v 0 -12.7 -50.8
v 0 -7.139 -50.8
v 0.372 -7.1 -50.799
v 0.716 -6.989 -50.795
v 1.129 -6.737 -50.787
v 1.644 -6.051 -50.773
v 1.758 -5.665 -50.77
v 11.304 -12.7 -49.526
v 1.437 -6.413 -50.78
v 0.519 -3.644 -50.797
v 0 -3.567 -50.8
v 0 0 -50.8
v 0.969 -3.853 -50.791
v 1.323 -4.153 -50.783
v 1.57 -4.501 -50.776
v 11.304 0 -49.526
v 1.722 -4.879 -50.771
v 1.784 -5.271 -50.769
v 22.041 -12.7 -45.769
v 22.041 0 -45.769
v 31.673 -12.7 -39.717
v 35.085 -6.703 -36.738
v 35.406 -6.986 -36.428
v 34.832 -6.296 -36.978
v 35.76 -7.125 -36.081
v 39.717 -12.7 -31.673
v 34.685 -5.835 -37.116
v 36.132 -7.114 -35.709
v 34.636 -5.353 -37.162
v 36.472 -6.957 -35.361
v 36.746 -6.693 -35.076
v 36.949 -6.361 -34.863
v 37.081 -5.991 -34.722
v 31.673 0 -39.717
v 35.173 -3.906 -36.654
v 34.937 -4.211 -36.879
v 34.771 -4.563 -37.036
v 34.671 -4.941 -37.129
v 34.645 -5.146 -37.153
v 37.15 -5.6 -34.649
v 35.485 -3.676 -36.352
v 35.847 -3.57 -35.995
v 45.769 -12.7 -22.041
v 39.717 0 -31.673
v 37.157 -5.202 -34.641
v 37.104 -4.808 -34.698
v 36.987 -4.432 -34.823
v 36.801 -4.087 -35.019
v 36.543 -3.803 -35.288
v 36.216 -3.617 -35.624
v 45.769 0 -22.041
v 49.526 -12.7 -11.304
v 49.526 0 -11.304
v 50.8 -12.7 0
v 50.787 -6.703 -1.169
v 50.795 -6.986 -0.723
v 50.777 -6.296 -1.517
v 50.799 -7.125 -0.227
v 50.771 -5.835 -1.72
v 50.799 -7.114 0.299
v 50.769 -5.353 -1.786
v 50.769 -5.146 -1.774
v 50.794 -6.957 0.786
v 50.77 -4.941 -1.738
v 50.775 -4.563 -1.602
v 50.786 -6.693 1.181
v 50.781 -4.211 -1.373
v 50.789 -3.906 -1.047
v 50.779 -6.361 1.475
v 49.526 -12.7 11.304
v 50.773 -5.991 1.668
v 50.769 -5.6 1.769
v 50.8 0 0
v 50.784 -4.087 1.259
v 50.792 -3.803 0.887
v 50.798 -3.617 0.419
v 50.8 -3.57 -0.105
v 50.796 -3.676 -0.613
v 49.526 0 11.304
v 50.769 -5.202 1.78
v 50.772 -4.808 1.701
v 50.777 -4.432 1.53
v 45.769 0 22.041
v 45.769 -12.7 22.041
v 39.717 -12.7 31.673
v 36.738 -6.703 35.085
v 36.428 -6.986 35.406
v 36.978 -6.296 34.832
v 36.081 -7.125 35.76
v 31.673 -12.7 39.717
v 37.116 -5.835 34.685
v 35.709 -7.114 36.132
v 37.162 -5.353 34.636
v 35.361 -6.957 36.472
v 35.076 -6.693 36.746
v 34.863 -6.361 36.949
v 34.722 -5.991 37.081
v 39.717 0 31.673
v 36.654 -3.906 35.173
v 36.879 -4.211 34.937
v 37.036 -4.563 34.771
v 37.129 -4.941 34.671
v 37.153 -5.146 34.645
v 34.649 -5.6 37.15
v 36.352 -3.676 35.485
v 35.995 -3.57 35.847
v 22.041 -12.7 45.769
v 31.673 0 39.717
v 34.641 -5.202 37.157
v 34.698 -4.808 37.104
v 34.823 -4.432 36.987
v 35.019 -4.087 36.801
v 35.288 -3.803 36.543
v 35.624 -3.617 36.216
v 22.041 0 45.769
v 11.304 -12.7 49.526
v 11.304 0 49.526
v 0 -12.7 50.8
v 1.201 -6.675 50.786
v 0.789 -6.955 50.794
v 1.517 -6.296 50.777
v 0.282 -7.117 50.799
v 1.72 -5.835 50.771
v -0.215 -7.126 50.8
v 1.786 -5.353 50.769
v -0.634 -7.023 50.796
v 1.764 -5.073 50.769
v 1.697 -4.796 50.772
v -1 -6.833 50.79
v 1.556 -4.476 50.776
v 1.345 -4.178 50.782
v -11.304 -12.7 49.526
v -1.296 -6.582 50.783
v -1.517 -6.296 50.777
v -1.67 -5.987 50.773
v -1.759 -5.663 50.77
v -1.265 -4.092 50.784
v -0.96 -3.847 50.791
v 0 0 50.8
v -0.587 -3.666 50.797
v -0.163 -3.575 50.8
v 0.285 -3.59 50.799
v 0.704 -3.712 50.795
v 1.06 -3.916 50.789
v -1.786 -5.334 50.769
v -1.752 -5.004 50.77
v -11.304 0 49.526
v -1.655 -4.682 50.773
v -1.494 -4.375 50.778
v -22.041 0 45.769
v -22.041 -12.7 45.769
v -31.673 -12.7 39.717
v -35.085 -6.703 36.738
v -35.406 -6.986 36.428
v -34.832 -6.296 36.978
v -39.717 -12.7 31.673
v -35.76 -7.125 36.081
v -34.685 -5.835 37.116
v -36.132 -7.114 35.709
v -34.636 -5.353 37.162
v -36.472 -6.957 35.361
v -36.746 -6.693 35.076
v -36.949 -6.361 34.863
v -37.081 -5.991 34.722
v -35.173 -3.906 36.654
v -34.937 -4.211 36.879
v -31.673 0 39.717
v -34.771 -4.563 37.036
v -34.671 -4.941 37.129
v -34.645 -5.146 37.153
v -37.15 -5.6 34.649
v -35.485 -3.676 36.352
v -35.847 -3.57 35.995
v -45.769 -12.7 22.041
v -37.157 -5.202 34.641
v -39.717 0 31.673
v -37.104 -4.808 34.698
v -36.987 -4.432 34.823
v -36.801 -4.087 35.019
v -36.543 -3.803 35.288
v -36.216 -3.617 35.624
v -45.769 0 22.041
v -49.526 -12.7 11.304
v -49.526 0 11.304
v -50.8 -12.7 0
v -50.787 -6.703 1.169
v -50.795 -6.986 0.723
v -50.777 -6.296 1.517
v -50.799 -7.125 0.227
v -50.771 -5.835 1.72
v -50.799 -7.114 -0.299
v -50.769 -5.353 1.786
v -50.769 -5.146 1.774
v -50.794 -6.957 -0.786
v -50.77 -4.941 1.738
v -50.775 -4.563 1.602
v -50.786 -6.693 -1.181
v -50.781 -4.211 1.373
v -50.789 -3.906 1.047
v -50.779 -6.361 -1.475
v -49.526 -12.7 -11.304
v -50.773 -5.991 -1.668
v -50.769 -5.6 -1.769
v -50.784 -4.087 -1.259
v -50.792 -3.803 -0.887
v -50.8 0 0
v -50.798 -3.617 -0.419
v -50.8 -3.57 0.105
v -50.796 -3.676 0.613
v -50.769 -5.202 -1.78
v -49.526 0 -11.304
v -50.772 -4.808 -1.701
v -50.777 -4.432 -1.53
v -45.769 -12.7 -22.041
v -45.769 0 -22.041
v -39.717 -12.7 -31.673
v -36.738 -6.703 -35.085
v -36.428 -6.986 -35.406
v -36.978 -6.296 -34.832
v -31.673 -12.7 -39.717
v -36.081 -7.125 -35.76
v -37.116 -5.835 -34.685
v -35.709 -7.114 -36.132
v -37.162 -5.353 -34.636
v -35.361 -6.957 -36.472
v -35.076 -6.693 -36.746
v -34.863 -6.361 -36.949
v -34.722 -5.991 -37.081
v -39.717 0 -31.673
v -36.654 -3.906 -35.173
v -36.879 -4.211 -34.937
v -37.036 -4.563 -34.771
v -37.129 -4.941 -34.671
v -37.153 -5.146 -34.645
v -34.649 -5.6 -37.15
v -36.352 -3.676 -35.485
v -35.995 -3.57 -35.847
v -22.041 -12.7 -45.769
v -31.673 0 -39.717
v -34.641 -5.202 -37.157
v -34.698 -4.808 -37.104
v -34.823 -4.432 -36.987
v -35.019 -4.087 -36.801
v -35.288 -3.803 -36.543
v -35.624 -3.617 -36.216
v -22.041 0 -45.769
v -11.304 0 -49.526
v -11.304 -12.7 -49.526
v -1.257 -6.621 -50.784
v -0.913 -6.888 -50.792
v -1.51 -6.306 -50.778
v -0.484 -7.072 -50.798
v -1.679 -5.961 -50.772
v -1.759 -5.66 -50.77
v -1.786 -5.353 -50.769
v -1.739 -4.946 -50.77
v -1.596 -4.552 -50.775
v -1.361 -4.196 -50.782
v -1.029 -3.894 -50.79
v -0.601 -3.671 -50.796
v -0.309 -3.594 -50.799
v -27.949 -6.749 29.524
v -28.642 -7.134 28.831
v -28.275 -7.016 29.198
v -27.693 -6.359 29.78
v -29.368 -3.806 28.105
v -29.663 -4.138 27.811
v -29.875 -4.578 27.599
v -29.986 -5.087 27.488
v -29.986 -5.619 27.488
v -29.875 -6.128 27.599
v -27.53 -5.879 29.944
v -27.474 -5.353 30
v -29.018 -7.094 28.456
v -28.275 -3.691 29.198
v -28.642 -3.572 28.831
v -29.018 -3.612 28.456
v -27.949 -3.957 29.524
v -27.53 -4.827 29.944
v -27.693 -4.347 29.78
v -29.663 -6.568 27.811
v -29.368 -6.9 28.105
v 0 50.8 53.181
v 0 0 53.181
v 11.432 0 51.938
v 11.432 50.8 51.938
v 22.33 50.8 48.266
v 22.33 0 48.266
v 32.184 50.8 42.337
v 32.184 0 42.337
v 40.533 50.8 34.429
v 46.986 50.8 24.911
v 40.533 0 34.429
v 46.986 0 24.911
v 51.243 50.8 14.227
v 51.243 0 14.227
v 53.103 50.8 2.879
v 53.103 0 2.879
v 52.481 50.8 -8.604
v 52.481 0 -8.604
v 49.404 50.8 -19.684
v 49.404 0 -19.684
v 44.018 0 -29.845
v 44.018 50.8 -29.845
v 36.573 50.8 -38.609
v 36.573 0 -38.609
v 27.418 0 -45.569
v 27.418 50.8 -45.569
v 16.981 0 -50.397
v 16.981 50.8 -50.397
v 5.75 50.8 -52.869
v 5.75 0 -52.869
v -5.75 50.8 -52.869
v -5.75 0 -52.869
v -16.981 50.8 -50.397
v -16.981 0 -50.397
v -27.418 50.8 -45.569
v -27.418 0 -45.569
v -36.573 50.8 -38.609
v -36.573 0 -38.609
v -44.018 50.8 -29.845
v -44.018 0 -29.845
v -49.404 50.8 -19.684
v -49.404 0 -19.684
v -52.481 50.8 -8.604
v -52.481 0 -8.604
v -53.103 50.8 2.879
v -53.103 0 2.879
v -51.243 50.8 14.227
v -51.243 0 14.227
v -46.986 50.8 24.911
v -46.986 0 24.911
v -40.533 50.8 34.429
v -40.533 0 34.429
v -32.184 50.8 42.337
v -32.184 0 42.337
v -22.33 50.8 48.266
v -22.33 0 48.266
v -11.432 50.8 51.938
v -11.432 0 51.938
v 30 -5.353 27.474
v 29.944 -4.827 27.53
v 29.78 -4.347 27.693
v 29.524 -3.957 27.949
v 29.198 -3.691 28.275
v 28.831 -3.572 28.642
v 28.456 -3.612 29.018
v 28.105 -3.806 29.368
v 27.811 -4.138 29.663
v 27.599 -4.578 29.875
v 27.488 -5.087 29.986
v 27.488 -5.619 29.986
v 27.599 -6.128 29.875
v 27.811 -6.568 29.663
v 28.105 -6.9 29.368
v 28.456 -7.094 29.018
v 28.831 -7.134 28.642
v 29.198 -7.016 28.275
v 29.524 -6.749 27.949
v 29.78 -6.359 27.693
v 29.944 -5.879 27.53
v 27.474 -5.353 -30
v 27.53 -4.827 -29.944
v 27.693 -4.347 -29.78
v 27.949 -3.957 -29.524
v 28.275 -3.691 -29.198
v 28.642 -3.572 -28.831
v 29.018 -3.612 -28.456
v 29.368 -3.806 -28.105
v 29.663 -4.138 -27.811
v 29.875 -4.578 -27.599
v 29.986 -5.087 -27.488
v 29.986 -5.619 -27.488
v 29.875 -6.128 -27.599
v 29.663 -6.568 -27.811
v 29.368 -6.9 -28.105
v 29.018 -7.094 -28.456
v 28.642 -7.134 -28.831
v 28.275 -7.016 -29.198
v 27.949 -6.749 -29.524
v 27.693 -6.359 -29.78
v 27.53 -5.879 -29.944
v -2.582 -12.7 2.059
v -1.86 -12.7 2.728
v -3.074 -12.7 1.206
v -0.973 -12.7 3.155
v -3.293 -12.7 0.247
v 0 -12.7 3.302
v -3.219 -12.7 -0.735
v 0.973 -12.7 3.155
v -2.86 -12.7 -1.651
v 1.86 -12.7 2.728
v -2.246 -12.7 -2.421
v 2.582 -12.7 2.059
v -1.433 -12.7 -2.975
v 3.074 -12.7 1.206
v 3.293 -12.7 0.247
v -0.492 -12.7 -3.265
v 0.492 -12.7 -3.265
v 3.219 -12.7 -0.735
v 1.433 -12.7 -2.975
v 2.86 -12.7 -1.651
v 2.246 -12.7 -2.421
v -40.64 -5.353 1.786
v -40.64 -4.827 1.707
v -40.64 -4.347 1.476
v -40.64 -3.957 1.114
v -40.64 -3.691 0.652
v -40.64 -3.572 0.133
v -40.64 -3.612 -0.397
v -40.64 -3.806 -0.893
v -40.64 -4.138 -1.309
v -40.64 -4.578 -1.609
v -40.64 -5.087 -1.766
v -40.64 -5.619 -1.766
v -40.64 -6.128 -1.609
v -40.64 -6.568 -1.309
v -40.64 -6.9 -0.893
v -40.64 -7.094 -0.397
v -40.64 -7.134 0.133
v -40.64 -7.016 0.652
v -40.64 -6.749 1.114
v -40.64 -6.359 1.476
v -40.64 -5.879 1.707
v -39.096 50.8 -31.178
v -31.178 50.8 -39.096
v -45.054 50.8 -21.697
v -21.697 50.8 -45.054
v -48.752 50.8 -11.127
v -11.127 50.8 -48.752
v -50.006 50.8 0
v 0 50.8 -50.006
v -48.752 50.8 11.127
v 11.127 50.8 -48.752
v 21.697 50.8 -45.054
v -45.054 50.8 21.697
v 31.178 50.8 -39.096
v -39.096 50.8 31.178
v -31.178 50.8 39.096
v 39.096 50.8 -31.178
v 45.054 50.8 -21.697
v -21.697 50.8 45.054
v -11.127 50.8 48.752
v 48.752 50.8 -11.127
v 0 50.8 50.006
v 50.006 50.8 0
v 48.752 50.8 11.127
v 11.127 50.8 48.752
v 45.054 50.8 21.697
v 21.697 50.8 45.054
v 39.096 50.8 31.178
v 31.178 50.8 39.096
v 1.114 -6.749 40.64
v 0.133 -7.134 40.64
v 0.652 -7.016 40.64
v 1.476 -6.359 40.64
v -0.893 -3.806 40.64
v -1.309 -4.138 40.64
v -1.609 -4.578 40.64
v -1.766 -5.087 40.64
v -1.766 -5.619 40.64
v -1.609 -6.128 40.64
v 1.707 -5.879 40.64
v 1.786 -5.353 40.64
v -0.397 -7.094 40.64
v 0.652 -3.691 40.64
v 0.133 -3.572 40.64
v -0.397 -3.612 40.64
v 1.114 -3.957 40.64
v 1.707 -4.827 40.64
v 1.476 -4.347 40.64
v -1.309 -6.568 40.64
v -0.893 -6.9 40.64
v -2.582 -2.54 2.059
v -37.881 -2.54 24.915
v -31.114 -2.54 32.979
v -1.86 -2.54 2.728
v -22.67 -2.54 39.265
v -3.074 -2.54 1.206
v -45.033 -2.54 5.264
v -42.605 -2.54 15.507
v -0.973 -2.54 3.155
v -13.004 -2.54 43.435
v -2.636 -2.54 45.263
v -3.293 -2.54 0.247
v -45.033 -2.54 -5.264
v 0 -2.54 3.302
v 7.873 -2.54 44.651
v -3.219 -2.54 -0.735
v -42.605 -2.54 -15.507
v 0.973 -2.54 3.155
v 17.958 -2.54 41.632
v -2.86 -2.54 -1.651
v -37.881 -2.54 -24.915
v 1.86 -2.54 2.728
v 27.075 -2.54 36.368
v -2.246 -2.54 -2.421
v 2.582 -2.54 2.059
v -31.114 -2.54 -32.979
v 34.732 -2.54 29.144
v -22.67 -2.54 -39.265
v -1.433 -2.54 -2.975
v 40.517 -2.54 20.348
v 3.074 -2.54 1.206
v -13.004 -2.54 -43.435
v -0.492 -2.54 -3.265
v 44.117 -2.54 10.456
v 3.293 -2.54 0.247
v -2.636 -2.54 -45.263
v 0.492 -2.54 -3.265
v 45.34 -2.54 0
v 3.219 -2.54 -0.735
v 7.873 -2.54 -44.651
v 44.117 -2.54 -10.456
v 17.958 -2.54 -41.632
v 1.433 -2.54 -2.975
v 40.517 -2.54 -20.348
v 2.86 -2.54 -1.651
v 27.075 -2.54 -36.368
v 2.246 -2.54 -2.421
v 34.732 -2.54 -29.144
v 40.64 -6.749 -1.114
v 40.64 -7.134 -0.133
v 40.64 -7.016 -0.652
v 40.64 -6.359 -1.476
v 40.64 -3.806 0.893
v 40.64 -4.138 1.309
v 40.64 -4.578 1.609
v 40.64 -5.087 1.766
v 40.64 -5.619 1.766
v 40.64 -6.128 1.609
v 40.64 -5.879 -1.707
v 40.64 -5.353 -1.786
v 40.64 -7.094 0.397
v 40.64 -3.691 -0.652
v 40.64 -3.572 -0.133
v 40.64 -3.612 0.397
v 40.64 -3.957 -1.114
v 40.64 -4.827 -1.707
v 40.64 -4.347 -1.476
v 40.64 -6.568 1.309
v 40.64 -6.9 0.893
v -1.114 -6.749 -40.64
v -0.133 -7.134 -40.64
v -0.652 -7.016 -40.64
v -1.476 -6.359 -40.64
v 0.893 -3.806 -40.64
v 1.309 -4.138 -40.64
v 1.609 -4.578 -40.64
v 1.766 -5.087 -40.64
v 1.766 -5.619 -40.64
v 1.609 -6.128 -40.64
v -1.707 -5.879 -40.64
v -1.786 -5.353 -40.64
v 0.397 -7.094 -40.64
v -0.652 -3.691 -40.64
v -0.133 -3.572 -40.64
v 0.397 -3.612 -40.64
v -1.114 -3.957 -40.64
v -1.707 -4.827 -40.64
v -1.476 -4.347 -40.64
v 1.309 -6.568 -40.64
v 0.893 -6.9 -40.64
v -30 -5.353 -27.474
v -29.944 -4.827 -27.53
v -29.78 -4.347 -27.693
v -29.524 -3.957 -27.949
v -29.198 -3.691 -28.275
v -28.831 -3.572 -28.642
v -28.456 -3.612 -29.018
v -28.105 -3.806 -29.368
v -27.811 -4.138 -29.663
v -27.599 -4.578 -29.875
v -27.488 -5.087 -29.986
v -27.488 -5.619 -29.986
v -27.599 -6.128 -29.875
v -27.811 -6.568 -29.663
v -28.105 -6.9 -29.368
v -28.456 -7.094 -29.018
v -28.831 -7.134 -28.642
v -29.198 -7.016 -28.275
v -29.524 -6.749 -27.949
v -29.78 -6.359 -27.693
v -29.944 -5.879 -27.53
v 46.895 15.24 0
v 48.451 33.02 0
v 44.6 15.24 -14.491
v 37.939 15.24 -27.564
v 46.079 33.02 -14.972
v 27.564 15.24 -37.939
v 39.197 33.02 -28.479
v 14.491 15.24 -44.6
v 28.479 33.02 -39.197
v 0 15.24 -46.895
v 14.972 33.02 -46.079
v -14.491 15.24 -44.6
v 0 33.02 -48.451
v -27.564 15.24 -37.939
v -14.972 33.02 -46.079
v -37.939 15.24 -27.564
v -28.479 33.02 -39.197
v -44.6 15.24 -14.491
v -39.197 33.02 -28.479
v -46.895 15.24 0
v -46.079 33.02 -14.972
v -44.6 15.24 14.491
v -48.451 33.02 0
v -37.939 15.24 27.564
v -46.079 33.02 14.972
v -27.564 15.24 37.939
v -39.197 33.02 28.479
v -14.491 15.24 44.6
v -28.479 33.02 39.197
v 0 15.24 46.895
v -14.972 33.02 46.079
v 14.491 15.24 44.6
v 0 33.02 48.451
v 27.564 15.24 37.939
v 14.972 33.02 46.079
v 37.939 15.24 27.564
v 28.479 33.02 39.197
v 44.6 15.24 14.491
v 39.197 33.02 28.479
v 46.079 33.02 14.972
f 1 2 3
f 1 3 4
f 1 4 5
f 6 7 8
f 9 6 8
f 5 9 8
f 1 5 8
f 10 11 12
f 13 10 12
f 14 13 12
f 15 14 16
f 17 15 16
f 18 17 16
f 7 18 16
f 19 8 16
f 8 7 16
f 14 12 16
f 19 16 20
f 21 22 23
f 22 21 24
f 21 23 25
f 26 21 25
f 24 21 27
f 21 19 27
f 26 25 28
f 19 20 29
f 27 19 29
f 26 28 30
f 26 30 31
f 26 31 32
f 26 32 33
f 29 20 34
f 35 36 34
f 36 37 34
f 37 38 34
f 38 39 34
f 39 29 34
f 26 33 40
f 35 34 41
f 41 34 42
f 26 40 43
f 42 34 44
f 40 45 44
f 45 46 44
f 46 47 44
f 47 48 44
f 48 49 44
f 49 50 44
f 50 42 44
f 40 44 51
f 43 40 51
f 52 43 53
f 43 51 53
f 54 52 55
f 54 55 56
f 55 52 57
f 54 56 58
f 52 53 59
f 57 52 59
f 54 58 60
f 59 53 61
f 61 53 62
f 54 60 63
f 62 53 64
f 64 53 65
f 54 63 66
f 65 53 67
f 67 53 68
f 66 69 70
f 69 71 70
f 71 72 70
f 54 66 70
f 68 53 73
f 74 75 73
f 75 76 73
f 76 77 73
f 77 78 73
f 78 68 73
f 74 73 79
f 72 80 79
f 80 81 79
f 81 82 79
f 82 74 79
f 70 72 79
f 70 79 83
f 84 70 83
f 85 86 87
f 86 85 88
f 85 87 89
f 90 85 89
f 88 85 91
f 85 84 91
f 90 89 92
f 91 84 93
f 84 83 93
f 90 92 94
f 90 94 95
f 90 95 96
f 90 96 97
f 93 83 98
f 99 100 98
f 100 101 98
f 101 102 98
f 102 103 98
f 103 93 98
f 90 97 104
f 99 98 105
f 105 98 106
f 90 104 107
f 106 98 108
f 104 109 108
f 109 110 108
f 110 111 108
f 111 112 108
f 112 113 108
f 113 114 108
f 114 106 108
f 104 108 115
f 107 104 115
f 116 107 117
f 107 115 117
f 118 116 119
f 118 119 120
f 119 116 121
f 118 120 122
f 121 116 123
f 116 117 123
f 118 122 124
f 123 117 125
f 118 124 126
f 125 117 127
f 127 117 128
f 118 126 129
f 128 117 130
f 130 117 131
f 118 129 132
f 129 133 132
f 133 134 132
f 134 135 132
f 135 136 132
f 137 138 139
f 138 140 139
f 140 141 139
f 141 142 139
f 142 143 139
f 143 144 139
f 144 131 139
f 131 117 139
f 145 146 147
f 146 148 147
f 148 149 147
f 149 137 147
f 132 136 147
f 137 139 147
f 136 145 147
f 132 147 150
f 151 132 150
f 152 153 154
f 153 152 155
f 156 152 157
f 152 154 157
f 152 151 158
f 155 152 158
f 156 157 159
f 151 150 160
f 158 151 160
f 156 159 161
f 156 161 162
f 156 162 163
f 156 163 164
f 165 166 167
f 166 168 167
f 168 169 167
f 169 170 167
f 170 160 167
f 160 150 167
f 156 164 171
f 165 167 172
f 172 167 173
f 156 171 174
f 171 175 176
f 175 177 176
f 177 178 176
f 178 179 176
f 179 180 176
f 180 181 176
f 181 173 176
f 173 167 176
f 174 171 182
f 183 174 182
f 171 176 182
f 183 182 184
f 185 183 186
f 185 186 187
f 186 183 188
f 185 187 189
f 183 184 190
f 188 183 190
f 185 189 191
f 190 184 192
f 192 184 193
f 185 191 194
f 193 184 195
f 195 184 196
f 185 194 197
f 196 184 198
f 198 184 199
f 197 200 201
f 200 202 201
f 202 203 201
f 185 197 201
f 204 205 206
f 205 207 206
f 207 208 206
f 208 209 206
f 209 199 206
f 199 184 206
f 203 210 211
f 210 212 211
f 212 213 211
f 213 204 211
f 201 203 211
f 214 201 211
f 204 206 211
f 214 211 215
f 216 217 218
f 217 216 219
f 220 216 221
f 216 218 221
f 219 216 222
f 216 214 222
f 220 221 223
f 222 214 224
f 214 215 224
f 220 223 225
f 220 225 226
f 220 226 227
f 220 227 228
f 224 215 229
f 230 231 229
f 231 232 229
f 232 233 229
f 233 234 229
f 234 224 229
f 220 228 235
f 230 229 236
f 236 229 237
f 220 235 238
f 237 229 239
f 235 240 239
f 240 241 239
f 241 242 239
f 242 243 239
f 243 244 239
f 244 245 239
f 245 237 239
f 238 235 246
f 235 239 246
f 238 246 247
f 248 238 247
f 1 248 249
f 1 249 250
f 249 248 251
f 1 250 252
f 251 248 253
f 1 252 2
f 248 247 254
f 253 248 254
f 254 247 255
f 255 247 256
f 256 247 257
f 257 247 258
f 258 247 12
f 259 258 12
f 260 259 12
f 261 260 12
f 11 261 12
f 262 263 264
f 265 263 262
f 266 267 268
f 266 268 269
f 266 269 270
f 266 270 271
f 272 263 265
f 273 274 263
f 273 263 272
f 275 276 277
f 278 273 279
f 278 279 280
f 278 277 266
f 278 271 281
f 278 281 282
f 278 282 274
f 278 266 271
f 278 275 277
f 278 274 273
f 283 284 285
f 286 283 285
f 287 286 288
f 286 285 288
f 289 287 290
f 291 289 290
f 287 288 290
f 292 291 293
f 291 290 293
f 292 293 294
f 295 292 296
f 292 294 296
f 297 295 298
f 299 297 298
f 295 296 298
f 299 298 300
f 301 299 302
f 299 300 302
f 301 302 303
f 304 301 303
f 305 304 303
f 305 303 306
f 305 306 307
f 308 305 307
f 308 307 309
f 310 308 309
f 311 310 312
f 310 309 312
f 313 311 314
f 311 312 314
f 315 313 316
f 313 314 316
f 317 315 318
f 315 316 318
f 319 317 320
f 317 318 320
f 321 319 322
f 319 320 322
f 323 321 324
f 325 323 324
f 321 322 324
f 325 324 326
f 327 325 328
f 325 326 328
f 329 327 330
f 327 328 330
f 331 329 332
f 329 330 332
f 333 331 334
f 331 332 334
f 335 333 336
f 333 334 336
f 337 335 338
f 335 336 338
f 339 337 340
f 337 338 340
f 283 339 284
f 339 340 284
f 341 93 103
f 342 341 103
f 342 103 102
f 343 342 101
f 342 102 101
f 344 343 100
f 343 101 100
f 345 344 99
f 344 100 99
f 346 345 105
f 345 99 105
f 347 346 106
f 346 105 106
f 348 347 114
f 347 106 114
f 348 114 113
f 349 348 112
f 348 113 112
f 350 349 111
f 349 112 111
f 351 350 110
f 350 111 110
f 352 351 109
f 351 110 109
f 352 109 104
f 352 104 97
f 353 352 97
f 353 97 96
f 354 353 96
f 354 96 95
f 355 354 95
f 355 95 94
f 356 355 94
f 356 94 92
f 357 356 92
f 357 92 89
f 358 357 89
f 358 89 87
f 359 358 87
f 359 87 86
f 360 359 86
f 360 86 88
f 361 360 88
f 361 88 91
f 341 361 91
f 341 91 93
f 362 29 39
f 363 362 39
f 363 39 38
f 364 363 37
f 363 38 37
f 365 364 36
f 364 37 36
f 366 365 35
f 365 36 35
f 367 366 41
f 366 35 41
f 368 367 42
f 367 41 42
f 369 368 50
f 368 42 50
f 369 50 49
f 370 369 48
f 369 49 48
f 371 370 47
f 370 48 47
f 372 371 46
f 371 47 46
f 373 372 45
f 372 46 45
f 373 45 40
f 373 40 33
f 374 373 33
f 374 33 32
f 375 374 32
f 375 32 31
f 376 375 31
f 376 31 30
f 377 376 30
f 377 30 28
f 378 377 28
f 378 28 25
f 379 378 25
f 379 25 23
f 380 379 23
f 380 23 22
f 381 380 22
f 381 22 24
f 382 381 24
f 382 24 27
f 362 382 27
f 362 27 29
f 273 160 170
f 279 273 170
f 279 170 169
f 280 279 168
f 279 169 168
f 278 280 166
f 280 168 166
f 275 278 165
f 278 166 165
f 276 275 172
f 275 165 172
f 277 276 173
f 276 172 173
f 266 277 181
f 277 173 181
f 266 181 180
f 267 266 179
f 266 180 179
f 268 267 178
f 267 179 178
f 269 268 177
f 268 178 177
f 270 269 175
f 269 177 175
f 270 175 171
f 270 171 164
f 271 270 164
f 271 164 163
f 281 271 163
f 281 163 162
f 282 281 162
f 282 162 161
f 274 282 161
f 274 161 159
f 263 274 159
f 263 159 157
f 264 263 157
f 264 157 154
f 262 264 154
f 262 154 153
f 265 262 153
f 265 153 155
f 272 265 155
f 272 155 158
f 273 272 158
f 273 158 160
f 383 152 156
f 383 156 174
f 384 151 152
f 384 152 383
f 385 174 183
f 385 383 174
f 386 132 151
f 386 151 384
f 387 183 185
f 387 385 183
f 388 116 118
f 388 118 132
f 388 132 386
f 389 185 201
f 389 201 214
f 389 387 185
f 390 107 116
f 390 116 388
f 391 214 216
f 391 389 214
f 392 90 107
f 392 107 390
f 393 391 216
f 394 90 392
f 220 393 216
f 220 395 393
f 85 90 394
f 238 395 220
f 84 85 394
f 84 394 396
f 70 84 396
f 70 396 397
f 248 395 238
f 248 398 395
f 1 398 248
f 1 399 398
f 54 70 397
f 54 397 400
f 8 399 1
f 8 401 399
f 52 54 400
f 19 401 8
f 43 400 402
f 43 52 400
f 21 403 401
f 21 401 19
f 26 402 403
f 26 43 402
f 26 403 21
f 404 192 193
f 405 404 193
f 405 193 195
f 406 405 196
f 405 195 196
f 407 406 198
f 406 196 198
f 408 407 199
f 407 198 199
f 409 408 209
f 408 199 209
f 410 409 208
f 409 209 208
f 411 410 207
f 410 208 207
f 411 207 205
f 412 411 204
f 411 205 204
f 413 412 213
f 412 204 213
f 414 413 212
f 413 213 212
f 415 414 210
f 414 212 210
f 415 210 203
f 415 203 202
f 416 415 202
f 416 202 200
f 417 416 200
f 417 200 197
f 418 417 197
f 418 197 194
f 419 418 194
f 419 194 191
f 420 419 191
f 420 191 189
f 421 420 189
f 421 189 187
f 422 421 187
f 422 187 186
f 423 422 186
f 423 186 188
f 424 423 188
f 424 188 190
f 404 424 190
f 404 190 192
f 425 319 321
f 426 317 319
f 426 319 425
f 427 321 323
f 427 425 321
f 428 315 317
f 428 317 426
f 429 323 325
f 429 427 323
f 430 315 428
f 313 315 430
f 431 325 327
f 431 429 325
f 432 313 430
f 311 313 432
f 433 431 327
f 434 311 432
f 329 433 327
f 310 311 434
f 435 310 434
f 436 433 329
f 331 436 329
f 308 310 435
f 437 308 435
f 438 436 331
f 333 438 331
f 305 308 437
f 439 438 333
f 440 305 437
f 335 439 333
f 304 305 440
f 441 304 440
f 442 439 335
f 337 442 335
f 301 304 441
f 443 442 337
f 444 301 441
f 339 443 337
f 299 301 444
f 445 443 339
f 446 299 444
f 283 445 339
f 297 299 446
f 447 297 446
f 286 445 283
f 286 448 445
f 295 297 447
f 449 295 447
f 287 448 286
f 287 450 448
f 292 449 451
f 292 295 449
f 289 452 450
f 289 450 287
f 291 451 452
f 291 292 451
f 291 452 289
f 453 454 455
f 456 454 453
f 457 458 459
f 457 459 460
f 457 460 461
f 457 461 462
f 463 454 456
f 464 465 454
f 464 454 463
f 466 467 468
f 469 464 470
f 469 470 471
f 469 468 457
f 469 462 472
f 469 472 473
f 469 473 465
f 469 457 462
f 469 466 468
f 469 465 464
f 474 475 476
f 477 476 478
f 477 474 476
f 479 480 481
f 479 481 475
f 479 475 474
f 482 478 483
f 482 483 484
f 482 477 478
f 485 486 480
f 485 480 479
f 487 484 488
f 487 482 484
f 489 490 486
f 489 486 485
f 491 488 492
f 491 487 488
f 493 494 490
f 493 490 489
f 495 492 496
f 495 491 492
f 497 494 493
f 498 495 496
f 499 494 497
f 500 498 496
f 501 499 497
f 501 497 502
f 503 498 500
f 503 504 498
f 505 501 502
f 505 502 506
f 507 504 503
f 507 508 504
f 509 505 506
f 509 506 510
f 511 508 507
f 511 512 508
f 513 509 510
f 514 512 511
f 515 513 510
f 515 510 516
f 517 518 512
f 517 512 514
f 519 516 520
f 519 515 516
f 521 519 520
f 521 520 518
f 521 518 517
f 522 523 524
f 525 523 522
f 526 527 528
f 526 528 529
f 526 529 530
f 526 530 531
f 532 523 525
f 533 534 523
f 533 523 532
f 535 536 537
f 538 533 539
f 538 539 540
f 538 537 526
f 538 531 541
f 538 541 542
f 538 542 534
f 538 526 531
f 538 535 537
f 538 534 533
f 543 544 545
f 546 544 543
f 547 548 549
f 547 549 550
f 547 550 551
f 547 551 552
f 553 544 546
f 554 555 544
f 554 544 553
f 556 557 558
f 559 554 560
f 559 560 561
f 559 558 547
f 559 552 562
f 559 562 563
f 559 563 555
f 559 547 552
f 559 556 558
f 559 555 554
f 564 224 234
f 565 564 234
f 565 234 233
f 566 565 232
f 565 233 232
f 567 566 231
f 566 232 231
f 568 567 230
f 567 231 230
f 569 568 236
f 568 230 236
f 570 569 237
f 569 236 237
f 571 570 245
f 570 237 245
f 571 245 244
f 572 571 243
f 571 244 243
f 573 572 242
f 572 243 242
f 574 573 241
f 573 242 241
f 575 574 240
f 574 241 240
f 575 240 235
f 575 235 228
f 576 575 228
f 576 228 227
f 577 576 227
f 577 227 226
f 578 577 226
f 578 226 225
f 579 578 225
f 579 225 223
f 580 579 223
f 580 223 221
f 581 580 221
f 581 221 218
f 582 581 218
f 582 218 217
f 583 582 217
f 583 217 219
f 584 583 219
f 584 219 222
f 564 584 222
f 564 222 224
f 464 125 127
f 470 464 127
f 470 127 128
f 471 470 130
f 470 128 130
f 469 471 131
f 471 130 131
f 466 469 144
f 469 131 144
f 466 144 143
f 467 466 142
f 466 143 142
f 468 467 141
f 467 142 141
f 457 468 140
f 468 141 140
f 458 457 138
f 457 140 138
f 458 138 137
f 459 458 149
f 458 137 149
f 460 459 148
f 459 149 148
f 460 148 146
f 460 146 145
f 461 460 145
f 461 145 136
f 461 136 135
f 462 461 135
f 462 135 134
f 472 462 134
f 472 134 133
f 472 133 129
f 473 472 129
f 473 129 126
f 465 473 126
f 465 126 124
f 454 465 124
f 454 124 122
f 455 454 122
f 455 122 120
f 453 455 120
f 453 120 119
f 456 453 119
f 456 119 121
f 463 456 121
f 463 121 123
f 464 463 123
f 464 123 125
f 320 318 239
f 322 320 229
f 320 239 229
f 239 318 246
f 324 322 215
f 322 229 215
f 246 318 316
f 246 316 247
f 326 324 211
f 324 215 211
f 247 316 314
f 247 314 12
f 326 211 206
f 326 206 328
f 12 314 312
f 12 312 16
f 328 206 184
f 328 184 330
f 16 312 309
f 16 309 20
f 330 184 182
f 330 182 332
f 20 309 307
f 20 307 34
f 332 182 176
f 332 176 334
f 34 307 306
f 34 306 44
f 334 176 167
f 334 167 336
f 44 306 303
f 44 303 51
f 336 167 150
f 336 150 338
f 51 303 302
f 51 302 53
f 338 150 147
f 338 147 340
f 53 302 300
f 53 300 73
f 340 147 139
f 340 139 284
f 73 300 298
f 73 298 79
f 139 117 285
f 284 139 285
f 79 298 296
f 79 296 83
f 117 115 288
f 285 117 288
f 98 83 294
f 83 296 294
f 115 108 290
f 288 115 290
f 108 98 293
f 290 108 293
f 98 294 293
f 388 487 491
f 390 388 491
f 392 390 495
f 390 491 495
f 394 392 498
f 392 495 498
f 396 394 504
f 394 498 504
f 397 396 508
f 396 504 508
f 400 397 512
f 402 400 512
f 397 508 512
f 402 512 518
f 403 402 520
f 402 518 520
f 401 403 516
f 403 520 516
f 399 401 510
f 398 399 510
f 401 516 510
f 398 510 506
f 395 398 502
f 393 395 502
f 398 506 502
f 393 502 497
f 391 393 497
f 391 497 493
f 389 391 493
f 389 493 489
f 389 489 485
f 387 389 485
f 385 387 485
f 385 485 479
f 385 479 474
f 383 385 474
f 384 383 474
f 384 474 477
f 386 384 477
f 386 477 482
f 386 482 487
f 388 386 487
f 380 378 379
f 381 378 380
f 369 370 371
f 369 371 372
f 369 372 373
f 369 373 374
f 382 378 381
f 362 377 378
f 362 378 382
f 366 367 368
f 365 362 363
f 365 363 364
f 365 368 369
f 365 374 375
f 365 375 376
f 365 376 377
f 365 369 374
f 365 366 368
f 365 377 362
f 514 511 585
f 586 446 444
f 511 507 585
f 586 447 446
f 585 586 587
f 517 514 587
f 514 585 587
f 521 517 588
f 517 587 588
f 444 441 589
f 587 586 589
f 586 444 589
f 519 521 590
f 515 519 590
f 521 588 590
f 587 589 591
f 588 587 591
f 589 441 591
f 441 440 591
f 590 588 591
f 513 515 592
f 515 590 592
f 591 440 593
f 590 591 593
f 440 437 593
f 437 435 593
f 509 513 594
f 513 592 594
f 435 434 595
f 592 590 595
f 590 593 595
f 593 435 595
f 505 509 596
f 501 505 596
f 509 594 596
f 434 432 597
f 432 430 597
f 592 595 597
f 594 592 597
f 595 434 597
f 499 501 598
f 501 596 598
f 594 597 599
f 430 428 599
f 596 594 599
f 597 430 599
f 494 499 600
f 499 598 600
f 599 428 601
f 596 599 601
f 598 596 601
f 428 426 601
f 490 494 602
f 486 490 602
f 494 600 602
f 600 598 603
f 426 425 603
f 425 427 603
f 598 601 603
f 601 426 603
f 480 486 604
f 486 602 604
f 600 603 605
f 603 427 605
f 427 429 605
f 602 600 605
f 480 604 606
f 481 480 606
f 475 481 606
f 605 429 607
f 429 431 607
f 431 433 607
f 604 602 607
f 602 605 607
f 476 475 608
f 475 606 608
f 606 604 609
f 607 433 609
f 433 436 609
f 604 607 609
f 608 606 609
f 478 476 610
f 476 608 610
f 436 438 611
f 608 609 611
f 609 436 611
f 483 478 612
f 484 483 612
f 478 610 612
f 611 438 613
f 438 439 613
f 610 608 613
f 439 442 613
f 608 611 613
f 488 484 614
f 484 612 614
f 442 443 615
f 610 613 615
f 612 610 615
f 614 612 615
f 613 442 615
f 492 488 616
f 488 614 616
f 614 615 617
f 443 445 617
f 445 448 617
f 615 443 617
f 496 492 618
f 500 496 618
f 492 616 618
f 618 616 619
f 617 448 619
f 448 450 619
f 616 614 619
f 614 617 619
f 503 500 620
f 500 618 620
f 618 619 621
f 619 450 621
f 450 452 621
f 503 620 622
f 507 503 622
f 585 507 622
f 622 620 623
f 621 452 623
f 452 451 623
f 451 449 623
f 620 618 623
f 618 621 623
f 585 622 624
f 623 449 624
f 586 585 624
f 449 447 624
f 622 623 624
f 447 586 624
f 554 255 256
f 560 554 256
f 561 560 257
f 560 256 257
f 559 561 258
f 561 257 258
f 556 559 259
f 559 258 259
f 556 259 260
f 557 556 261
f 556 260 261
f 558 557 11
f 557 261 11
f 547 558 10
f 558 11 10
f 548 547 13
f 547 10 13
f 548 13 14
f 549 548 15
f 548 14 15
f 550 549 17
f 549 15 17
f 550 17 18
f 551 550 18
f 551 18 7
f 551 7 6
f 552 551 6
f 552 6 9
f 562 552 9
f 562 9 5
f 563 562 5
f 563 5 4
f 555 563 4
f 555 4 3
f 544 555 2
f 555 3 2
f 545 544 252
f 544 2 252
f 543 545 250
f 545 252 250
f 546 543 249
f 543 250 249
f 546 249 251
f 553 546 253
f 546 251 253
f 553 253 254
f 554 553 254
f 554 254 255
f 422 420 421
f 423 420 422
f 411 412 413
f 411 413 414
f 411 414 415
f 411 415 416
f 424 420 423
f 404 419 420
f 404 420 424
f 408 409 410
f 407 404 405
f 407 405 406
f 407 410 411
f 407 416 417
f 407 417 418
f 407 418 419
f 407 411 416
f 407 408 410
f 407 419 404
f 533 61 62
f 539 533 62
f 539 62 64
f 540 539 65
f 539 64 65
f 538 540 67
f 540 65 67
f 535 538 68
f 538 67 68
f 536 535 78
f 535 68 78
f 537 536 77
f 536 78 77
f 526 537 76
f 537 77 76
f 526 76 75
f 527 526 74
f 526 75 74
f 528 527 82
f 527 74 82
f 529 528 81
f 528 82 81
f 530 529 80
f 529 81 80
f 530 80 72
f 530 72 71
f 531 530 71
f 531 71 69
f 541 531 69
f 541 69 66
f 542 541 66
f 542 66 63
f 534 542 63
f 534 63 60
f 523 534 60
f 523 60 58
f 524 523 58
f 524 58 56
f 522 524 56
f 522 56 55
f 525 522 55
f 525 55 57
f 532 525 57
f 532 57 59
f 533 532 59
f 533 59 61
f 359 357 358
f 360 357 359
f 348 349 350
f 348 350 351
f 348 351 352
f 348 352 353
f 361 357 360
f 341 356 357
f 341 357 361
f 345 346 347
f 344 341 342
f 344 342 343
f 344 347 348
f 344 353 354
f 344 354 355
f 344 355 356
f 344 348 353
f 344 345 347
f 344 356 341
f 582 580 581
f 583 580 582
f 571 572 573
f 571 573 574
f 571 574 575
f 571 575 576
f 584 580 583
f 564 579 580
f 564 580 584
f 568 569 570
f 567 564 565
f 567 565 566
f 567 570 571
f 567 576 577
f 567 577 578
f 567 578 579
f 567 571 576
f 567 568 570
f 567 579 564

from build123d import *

# Parameters (mm, degrees)
SKETCH1_R           = 53.18125
BOSS_EXTRUDE1_DEPTH = 50.8
SKETCH2_R           = 50.8
SKETCH2_R_2         = 47.625
BOSS_EXTRUDE2_DEPTH = 12.7
SKETCH3_R           = 50.00625
CUT_EXTRUDE1_DEPTH  = 53.34
CUT_EXTRUDE1_DRAFT  = -5
SKETCH4_R           = 3.302
CUT_EXTRUDE2_DEPTH  = 93.204372473
SKETCH5_R           = 1.7859375
CUT_EXTRUDE3_DEPTH  = 10.16
CIRPATTERN1_COUNT   = 8


with BuildPart() as part:
    # Sketch1 → Boss-Extrude1 (new body)
    with BuildSketch(Plane(origin=(0, 0, 0), x_dir=(1, 0, 0), z_dir=(0, 1, 0))):
        with Locations(Location((0, 0, 0), (0, 0, 270))):
            Circle(SKETCH1_R)
    extrude(amount=BOSS_EXTRUDE1_DEPTH)

    # Sketch2 → Boss-Extrude2 (add)
    with BuildSketch(Plane.XZ):
        with Locations(Location((0, 0, 0), (0, 0, 270))):
            Circle(SKETCH2_R)
        Circle(SKETCH2_R_2, mode=Mode.SUBTRACT)
        Circle(SKETCH2_R_2)
    extrude(amount=BOSS_EXTRUDE2_DEPTH)


with BuildPart() as cut_extrude1_tool:
    # Sketch3 → Cut-Extrude1 (with draft: the straight prism first)
    with BuildSketch(Plane(origin=(0, 50.8, 0), x_dir=(1, 0, 0), z_dir=(0, 1, 0))):
        Circle(SKETCH3_R)
    extrude(amount=-CUT_EXTRUDE1_DEPTH)
    # Cut-Extrude1: the draft: its side faces are tilted about the plane it starts from
    cut_extrude1_sides = [cut_extrude1_tool.faces().sort_by_distance(p)[0] for p in [
        (-50.00625, 24.13, 0),
    ]]
    draft(cut_extrude1_sides, Plane(origin=(0, 50.8, 0), x_dir=(1, 0, 0), z_dir=(0, 1, 0)), CUT_EXTRUDE1_DRAFT)


with BuildPart() as part_1:
    add(part.part)

    # Cut-Extrude1: cut by cut_extrude1_tool
    add(cut_extrude1_tool.part, mode=Mode.SUBTRACT)

    # Sketch4 → Cut-Extrude2 (cut, through all)
    with BuildSketch(Plane(origin=(0, -2.54, 0), x_dir=(1, 0, 0), z_dir=(0, 1, 0))):
        with Locations(Location((0, 0, 0), (0, 0, 270))):
            Circle(SKETCH4_R)
    extrude(amount=-CUT_EXTRUDE2_DEPTH, mode=Mode.SUBTRACT)

    # Sketch5 → Cut-Extrude3 (cut)
    with BuildSketch(Plane(origin=(50.8, 0, 0), x_dir=(0, 0, -1), z_dir=(1, 0, 0))):
        with Locations((0, -5.35305)):
            Circle(SKETCH5_R)
    cut_extrude3 = extrude(amount=-CUT_EXTRUDE3_DEPTH, mode=Mode.SUBTRACT)

    # CirPattern1: Cut-Extrude3 ×8 about axis
    cirpattern1_axis = Axis((0, 0, 0), (0, 1, 0))
    for i in range(1, CIRPATTERN1_COUNT):
        add(cut_extrude3.rotate(cirpattern1_axis, i * 360 / CIRPATTERN1_COUNT), mode=Mode.SUBTRACT)


solid = part_1.part
